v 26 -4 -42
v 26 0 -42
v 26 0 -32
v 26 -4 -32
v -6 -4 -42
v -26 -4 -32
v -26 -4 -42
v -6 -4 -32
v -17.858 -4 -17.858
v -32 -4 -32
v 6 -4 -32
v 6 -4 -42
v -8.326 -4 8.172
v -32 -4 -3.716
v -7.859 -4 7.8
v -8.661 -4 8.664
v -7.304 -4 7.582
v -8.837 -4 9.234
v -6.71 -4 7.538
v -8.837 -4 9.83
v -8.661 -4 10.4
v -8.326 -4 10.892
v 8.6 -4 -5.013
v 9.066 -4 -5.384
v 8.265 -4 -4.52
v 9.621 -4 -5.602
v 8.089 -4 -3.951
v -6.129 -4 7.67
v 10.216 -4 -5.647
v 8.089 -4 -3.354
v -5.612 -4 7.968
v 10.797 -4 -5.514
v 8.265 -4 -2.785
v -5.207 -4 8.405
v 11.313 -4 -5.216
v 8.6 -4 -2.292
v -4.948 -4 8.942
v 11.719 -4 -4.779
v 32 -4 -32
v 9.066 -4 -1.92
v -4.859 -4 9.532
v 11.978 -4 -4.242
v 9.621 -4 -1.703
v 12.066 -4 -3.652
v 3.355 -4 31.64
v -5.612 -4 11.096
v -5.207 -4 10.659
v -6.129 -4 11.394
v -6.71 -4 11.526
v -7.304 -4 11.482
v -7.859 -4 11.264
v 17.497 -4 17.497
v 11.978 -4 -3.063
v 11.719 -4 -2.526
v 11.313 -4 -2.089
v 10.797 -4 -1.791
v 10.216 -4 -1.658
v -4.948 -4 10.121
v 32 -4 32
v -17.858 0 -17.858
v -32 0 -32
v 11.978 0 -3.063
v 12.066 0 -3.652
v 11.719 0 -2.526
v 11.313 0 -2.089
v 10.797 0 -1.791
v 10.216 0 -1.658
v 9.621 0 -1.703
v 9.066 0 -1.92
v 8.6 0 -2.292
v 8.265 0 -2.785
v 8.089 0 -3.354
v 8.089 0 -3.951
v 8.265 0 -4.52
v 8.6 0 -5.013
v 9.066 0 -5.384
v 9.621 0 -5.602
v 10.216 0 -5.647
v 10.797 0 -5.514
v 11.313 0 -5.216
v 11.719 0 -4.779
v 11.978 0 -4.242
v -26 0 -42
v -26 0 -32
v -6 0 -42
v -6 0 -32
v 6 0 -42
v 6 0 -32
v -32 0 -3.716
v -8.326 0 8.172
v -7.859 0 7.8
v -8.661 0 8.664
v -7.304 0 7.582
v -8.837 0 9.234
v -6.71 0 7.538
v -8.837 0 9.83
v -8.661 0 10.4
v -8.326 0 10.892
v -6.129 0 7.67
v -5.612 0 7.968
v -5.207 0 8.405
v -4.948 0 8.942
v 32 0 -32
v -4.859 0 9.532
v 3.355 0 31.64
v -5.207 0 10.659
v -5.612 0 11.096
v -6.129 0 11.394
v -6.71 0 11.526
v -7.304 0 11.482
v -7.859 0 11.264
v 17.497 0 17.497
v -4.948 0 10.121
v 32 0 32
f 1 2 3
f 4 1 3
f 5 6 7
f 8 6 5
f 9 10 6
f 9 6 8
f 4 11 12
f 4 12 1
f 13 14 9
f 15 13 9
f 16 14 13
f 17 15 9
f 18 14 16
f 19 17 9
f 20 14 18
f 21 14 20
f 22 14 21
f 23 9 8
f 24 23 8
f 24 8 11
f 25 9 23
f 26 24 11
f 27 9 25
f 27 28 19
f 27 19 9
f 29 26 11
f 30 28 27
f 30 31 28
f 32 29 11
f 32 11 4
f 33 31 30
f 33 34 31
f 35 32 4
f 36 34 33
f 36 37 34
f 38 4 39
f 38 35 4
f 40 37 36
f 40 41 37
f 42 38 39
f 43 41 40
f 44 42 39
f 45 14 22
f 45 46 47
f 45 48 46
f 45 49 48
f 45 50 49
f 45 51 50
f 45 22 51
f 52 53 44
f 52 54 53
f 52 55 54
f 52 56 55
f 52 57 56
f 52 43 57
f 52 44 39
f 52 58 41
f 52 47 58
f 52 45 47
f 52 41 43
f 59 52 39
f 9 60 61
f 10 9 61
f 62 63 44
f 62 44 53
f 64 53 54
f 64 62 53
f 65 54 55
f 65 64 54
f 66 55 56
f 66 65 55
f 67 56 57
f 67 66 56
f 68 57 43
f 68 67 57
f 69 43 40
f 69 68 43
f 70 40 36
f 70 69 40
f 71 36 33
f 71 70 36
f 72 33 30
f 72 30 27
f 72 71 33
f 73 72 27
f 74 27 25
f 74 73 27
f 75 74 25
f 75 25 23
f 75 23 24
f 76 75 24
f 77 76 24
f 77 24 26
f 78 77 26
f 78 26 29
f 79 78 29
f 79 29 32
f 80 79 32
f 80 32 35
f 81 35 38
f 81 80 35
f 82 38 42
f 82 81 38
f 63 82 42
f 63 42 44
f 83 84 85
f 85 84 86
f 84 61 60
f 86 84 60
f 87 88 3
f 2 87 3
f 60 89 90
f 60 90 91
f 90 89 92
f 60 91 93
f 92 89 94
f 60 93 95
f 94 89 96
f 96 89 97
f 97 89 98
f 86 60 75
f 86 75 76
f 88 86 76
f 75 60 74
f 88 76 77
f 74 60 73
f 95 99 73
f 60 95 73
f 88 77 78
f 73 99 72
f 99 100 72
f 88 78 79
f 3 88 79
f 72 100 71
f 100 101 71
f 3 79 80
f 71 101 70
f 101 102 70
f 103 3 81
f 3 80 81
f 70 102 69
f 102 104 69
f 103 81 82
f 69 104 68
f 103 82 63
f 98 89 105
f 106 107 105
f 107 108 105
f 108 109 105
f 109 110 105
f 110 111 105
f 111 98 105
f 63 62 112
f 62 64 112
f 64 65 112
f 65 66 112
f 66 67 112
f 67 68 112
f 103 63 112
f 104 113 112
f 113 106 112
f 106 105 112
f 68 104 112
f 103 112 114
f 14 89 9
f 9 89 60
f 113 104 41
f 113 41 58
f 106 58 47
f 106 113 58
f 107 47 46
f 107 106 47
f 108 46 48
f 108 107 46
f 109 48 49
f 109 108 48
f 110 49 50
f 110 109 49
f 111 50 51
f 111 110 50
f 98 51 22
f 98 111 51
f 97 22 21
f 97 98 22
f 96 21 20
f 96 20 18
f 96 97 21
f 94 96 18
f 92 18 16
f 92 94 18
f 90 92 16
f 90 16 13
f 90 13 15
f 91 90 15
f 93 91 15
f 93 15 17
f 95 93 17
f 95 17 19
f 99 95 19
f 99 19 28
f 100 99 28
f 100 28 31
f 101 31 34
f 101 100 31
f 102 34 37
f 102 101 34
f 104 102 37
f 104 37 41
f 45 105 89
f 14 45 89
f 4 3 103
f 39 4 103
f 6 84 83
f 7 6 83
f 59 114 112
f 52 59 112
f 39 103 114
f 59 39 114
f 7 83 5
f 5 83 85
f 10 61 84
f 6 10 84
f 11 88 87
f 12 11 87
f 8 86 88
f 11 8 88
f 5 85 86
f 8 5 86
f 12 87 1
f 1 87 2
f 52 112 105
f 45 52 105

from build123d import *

# Parameters (mm, degrees)
F0_R     = 2
F1_DEPTH = 4


with BuildPart() as f1:
    # F0 (on Front) → F1 (new body)
    with BuildSketch(Plane.XZ):
        Polygon((32, -32), (32, 32), (17.497475, 17.497475), (3.355339, 31.63961), (-32, -3.715729), (-17.857864, -17.857864), (-32, -32), (-26, -32), (-26, -42), (-6, -42), (-6, -32), (6, -32), (6, -42), (26, -42), (26, -32), align=None)
        with Locations((-6.859445, 9.531957)):
            Circle(F0_R, mode=Mode.SUBTRACT)
        with Locations((10.066459, -3.652432)):
            Circle(F0_R, mode=Mode.SUBTRACT)
    extrude(amount=F1_DEPTH)


solid = f1.part
